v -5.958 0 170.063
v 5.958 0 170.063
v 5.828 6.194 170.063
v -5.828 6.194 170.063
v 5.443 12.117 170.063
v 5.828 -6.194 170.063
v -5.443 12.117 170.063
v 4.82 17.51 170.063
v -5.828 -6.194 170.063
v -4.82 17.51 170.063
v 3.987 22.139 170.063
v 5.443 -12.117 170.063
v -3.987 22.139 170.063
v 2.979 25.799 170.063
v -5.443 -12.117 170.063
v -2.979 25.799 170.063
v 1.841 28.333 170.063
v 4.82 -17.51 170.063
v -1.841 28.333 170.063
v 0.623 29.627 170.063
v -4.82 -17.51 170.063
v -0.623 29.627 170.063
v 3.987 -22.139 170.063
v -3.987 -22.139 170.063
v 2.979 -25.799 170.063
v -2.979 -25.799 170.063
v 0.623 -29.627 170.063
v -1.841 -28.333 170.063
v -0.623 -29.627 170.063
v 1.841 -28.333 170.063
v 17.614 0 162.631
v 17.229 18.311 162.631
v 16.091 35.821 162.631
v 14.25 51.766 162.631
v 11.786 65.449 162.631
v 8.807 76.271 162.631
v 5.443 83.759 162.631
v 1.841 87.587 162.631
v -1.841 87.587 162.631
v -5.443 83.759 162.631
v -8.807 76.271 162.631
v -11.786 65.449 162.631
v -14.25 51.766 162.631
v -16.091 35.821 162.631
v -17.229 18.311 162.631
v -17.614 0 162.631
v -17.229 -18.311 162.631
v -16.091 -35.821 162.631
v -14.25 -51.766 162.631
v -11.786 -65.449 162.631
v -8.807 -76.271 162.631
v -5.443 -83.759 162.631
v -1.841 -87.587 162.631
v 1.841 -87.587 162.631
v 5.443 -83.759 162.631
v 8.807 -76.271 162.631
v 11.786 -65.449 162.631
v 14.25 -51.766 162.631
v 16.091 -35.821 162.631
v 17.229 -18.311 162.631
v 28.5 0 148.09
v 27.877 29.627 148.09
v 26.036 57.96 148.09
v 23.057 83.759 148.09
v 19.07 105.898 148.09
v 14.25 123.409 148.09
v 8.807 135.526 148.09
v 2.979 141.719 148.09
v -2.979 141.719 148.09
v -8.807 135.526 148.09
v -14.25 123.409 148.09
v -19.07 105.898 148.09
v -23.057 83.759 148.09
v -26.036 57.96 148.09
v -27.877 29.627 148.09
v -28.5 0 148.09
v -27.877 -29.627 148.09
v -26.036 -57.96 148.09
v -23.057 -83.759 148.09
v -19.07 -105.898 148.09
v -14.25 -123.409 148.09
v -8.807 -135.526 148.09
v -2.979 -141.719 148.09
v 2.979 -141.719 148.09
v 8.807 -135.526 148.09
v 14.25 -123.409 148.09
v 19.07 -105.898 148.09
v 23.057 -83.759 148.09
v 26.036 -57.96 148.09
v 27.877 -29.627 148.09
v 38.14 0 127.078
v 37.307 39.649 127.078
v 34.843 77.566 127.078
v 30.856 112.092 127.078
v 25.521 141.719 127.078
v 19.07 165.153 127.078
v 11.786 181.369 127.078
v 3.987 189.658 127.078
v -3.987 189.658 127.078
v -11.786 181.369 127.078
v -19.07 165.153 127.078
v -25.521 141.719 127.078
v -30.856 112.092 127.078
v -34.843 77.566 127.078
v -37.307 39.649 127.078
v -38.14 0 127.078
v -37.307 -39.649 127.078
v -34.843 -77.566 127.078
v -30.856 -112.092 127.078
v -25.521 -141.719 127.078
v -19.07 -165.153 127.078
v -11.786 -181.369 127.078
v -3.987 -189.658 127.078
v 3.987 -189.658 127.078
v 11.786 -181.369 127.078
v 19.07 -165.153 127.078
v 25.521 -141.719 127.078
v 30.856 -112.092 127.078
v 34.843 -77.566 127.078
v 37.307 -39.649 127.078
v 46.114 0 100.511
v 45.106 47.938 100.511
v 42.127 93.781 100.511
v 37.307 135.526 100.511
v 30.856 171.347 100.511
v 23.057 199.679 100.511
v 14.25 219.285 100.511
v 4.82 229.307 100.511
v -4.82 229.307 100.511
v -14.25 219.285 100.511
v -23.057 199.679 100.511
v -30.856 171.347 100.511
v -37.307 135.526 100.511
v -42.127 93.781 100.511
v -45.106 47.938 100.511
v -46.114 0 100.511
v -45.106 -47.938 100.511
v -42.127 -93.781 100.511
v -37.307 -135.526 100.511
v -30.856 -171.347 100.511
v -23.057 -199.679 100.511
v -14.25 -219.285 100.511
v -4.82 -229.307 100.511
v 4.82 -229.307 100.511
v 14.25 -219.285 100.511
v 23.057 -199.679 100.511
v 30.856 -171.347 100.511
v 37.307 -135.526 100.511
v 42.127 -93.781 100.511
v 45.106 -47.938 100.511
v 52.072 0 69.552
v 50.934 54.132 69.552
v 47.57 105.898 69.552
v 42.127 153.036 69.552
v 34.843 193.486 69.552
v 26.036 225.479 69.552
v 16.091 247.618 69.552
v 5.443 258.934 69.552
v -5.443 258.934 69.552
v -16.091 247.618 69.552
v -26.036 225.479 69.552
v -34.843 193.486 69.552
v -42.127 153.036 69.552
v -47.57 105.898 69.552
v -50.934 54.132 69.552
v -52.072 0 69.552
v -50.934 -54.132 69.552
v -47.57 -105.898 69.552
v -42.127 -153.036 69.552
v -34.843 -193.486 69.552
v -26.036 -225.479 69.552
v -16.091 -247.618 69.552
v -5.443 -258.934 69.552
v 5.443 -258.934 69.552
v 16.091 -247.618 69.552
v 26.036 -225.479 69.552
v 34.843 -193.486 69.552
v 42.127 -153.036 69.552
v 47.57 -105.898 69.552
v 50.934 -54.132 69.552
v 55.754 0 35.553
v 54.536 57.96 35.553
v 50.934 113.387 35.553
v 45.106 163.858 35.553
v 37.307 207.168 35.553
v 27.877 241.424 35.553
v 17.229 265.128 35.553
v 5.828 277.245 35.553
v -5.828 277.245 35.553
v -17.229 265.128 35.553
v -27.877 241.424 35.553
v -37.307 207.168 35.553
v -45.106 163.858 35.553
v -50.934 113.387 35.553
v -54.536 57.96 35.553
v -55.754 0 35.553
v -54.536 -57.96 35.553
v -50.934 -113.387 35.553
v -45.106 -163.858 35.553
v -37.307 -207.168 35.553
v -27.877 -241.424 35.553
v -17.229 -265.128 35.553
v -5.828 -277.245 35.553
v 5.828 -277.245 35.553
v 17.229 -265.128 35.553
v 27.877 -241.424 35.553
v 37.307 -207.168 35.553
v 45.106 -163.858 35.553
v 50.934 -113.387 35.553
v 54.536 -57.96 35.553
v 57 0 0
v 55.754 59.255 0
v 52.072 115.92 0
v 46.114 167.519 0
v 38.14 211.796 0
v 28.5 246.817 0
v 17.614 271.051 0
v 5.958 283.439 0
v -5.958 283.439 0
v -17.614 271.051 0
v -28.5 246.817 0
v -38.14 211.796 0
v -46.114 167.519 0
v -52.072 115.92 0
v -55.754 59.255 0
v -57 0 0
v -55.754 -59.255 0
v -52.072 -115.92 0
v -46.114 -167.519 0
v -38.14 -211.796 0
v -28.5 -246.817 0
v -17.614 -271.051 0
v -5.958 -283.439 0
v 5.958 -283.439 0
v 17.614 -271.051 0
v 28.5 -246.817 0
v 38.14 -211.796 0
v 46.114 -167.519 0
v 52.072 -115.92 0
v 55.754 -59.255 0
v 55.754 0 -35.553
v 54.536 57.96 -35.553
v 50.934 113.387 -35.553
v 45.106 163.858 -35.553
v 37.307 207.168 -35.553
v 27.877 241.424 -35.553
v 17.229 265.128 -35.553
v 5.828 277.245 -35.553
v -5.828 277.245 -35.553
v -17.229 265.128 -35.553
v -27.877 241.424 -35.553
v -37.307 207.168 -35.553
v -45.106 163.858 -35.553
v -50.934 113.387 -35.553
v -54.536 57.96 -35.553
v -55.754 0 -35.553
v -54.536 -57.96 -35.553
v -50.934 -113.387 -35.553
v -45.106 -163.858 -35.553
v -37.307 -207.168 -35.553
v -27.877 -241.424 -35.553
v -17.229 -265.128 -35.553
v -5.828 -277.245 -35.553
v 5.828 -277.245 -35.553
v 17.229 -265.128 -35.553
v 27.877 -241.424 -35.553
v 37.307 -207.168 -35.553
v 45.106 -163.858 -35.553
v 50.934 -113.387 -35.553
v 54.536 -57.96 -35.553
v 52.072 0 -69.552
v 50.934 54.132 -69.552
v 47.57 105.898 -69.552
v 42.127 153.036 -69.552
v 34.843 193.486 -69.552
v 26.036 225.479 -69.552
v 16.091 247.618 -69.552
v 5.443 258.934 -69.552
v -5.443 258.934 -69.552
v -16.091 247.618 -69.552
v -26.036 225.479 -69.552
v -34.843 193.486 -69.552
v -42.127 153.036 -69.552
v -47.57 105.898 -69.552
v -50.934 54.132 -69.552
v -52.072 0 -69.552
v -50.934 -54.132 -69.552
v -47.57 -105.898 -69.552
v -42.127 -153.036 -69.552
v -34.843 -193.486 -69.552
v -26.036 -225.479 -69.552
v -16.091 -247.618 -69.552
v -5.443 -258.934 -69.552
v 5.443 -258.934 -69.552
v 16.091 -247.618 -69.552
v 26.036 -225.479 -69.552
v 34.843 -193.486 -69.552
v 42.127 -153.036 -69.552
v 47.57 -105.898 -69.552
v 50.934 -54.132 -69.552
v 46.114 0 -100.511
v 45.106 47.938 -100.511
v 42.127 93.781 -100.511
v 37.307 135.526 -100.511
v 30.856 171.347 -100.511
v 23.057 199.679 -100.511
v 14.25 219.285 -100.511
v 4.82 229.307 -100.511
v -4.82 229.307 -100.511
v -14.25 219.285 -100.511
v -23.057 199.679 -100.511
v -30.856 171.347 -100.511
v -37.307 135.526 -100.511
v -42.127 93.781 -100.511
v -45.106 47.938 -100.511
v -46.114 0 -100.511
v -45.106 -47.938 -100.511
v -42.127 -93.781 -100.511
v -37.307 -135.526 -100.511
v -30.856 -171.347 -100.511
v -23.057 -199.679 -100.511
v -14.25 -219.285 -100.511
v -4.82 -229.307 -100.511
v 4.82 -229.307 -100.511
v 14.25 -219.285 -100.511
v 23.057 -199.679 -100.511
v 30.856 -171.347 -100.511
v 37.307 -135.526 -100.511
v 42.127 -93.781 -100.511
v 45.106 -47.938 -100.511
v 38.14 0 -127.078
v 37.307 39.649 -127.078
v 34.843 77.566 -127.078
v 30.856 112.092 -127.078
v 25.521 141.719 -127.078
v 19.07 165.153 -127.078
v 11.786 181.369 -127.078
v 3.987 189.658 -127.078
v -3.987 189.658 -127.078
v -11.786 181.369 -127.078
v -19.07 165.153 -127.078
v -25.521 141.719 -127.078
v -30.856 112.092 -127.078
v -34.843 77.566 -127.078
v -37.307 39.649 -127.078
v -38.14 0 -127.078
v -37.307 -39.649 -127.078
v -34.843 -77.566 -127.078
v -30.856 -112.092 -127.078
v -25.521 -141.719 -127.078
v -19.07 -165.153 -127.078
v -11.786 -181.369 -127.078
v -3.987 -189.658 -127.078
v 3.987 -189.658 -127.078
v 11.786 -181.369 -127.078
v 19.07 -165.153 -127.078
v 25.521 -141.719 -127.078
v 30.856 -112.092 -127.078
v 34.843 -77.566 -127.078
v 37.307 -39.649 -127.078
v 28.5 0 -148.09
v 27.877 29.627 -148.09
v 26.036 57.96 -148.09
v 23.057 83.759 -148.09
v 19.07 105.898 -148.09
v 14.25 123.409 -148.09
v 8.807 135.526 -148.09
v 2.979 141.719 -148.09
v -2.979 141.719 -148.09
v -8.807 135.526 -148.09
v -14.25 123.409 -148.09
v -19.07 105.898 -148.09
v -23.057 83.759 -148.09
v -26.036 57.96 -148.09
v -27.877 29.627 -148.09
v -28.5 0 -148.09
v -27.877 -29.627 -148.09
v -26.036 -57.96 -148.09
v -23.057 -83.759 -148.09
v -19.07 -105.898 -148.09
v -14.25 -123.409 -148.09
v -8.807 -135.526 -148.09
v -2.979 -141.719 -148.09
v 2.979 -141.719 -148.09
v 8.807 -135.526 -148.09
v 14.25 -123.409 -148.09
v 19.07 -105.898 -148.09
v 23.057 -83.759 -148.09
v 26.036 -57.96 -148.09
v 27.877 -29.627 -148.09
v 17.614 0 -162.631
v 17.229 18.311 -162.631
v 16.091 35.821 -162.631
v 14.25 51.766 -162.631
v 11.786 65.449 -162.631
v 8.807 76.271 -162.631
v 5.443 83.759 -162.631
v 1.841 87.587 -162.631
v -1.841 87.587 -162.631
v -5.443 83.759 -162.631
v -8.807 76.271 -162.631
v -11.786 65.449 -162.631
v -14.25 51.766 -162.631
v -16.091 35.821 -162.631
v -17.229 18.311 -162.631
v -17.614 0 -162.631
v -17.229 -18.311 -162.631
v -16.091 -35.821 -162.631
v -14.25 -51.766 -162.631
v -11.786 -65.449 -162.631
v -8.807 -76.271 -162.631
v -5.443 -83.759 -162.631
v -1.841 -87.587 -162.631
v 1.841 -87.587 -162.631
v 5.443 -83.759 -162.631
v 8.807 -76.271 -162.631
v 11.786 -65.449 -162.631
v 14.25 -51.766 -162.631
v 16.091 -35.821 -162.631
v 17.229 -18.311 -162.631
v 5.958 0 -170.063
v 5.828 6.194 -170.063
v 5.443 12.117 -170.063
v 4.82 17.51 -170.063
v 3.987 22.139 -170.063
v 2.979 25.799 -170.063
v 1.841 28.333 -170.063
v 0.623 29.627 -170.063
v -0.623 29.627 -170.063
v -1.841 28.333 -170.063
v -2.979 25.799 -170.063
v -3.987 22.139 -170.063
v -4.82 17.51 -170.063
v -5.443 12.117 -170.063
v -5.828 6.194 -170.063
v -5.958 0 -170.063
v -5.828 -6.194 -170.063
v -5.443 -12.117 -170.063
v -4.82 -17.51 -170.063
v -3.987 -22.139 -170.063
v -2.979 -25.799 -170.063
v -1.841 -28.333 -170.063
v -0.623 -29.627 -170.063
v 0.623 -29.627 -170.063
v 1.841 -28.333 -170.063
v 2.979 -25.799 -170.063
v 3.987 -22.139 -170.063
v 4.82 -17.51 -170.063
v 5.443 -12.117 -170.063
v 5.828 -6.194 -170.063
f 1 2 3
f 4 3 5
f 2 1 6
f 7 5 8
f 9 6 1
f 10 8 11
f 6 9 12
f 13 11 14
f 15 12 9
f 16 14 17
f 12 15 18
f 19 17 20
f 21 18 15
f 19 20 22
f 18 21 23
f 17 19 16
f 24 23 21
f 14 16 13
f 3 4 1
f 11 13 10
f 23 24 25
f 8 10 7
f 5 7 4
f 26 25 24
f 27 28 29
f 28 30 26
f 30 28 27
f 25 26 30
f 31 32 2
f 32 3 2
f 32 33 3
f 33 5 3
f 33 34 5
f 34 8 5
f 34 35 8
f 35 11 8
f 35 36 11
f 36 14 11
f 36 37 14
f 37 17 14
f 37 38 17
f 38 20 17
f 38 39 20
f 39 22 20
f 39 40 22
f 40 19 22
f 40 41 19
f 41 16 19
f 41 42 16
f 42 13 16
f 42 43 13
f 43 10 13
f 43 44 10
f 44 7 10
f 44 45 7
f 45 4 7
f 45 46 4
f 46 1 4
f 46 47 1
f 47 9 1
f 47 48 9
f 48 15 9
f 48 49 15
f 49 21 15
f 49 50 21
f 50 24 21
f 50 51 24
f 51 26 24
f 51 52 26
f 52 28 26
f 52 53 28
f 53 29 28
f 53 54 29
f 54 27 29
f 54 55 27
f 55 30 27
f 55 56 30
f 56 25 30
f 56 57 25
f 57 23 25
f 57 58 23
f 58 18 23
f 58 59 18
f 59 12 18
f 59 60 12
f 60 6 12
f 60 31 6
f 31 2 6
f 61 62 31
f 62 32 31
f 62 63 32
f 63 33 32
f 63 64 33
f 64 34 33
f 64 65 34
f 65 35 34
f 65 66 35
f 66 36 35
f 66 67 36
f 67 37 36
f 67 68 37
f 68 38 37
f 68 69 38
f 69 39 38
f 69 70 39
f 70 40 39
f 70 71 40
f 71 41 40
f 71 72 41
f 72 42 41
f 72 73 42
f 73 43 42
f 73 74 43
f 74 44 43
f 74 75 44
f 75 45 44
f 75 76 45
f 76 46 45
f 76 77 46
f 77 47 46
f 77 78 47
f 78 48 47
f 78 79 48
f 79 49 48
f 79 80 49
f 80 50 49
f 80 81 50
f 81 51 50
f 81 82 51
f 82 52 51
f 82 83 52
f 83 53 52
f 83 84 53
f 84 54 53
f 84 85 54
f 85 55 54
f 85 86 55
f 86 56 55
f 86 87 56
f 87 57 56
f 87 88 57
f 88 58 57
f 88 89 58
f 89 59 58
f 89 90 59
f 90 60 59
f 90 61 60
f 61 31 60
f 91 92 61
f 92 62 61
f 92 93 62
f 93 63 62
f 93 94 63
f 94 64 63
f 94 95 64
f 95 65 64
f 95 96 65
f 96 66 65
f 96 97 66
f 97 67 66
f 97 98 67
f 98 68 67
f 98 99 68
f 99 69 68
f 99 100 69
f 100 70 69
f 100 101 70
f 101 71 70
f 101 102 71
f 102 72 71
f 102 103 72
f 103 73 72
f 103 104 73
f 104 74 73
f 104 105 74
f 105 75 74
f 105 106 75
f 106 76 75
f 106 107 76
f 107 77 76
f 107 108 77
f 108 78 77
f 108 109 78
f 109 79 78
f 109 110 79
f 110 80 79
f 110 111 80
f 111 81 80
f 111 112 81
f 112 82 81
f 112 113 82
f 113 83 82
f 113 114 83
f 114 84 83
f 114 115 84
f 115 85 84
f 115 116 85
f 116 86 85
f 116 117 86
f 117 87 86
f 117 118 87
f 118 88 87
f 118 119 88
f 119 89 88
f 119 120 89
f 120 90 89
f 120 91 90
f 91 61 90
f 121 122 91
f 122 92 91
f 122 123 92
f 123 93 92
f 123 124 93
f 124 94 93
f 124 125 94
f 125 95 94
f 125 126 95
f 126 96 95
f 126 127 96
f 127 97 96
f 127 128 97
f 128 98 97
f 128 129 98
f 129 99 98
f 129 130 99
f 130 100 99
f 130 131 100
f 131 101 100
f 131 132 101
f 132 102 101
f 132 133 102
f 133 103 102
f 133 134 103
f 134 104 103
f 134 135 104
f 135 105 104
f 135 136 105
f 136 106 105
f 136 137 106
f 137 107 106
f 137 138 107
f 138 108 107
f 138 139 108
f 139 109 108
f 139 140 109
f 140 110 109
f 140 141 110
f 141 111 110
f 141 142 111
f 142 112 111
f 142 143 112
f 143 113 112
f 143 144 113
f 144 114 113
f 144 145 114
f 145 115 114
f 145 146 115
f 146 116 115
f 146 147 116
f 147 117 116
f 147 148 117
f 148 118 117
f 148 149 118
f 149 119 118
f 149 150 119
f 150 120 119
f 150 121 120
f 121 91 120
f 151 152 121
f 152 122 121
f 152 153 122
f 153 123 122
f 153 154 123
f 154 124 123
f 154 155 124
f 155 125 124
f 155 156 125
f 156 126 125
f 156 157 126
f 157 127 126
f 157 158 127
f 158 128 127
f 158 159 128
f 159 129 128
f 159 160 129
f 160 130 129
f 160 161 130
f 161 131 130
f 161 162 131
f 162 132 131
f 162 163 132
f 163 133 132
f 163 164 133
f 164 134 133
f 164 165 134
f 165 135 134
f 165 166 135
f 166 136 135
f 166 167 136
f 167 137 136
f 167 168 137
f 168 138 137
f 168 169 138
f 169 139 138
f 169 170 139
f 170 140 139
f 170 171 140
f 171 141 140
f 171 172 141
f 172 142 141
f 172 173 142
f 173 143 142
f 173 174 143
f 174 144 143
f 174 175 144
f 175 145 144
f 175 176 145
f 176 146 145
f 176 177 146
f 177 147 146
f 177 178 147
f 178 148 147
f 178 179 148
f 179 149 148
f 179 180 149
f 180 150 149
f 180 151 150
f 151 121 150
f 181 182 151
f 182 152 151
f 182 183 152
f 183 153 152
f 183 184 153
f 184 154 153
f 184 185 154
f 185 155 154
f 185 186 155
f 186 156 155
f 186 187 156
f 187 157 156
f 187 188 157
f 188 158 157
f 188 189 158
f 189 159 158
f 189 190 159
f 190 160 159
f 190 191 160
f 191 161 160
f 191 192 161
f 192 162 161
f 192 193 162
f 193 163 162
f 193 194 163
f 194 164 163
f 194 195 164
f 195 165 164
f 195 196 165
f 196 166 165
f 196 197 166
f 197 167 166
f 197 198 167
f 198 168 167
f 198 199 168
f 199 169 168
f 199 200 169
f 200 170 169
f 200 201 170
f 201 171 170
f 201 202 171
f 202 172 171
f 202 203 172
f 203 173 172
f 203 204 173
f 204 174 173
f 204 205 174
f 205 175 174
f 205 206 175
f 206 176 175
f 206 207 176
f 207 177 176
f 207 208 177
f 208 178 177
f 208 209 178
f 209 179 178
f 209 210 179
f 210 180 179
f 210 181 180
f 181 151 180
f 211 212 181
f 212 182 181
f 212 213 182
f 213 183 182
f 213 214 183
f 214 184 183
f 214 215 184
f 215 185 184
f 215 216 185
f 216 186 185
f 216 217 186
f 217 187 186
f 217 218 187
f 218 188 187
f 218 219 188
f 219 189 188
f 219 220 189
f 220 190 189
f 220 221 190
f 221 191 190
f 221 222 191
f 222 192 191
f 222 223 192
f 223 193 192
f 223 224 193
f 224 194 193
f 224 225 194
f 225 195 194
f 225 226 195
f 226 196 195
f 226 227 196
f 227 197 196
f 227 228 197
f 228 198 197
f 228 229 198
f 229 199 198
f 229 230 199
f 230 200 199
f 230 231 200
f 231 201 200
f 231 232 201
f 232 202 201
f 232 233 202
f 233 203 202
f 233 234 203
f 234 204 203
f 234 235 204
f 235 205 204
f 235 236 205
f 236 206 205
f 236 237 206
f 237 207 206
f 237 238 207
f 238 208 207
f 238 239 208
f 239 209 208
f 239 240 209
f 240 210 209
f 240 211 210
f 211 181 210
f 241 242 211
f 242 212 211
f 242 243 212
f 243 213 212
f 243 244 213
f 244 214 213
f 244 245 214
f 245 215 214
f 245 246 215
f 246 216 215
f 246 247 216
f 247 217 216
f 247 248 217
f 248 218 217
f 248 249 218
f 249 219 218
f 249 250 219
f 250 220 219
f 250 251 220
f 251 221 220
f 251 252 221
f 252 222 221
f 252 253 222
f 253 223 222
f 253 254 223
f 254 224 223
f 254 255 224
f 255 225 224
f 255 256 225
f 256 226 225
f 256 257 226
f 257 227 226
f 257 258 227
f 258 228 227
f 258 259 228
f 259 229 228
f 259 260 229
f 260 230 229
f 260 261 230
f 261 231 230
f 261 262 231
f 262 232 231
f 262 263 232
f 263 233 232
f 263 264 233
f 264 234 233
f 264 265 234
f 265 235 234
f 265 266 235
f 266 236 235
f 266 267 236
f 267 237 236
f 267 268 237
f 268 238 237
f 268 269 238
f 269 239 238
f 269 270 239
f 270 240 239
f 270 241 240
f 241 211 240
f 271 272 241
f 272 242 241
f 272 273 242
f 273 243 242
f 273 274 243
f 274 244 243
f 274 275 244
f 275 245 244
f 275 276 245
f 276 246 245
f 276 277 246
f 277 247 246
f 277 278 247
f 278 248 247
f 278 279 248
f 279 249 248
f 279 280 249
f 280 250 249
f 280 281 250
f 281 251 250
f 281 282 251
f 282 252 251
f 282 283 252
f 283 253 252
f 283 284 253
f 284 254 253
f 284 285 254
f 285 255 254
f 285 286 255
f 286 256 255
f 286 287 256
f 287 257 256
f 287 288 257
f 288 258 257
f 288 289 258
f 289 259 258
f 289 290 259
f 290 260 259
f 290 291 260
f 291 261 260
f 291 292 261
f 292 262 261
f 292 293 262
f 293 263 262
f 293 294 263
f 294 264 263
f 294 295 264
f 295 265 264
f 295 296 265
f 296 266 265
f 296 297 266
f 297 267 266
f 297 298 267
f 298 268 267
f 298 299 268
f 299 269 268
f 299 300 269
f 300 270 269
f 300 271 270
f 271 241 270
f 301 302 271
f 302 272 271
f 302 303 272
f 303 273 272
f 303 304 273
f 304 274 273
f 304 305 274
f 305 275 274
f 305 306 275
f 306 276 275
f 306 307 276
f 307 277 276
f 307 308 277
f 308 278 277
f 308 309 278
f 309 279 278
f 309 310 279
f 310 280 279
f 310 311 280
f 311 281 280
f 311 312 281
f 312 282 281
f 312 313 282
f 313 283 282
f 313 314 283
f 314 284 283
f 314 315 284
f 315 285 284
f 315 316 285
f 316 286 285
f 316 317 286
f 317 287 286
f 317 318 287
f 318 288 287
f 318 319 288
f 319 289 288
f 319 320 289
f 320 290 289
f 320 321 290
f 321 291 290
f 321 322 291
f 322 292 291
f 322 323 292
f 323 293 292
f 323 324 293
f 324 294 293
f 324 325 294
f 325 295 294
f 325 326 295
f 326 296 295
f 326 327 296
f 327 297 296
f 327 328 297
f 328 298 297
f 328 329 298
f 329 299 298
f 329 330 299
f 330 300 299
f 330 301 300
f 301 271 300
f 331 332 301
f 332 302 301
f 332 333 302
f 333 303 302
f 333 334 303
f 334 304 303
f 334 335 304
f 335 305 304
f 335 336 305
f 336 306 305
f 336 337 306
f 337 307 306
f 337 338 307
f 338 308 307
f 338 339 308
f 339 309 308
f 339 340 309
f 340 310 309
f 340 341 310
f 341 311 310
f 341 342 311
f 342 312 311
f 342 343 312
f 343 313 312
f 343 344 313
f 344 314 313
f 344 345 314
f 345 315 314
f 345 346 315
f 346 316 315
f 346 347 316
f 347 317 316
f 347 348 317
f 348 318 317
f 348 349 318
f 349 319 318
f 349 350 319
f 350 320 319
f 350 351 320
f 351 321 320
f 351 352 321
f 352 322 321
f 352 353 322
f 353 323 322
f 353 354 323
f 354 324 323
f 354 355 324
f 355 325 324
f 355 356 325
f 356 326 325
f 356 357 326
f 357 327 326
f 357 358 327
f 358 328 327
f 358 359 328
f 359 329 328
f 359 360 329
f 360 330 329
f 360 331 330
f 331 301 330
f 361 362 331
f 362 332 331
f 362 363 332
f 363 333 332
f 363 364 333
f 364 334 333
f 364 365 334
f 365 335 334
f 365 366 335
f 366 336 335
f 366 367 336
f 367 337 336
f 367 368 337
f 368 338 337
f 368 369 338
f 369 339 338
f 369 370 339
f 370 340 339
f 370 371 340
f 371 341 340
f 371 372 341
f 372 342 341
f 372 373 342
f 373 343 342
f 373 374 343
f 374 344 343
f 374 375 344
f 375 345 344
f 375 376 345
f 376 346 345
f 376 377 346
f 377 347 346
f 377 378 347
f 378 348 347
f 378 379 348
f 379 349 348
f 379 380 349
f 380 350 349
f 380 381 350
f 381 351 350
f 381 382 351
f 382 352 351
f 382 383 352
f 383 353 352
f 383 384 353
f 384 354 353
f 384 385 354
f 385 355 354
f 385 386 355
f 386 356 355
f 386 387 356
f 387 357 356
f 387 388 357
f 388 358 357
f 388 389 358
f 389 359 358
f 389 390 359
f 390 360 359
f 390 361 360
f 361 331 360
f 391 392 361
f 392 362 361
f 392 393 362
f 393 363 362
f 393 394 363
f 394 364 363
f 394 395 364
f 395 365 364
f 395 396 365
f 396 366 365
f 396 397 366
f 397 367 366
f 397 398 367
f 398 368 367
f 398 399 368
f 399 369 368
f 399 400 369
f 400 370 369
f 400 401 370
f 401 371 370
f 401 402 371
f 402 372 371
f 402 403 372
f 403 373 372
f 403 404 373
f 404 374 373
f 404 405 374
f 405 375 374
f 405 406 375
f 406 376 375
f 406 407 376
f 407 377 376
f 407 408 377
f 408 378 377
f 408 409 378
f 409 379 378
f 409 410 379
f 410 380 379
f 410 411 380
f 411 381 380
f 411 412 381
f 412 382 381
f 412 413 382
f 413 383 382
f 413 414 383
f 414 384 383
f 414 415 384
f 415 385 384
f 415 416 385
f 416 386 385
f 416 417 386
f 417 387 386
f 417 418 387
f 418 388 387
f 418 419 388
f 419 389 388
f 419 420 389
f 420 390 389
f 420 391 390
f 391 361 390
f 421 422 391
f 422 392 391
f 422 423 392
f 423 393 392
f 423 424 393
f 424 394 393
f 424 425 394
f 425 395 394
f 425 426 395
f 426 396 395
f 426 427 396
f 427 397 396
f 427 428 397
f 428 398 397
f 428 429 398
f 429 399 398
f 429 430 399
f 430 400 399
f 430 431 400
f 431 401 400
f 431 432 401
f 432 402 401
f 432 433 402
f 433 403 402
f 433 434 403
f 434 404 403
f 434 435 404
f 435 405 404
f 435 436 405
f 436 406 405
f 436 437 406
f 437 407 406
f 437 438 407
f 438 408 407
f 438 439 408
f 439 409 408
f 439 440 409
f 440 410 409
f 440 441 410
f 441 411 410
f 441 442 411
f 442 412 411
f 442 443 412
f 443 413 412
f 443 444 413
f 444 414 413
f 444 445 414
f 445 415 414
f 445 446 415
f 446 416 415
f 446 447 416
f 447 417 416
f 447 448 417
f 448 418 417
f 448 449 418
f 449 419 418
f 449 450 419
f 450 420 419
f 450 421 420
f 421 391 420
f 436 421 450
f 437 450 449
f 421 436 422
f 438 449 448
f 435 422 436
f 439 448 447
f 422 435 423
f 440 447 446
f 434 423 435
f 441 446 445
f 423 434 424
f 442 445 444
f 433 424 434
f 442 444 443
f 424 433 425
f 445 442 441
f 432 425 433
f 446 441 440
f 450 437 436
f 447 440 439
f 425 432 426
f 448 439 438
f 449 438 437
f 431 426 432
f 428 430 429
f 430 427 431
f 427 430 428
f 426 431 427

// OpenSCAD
// Generated by SolidPython 1.0.1 on 2020-07-29 00:46:45


scale(v = [3, 15, 9]) {
	sphere(r = 19);
}
/***********************************************
*********      SolidPython code:      **********
************************************************
 
# import packages: SolidPython
from solid import *
from solid.utils import *
from itertools import chain, combinations, permutations


class Resize:

    def __init__(self, scad_file):
        self.scad_file = scad_file
        #self.scad_file = import_scad(scad_file)
        # cone/cylinder param:
        self.r1 = 0
        self.r2 = 0
        self.h = 0
        # rectangular prism param:
        self.w = 0
        self.l = 0
        # ellipse param:
        self.r = 0

    # import OpenScad code (file name corresponds to shape)


    # classify shape + parameters
    def assign(self, param1, param2, param3):
        if self.scad_file == 'cone.scad':
            self.r1 = param1
            self.r2 = param2
            self.h = param3
        elif self.scad_file == 'cylinder.scad':
            self.r1 = param1
            self.r2 = param2
            self.h = param3
        elif self.scad_file == 'rectangularPrism.scad':
            self.h = param1
            self.l = param2
            self.w = param3
        else:
            self.r = param1
            self.h = param2

    # resize parameters
    def iterate(self):
        x = range(3, 20, 2)
        i = 1
        if self.scad_file == 'cone.scad':
            tempList = list(permutations(x, 2))
            for temp in tempList:
                param1 = temp[0]
                param2 = temp[1]
                filepath = 'produced_scad_files/' + 'cone' + str(param1) + '_' + str(param2) + '_' + '.scad'
                scad_render_to_file(cylinder(h=param1, r1=param2, r2=0), filepath)

        elif self.scad_file == 'cylinder.scad':
            tempList = list(permutations(x, 3))
            for temp in tempList:
                param1 = temp[0]
                param2 = temp[1]
                filepath = 'produced_scad_files/' + 'cylinder' + str(param1) + '_' + str(param2) + '_' + '.scad'
                scad_render_to_file(cylinder(h=param1, r1=param2, r2=param2), filepath)

        elif self.scad_file == 'rectangularPrism.scad':
            tempList = list(permutations(x, 3))
            for temp in tempList:
                param1 = temp[0]
                param2 = temp[1]
                param3 = temp[2]
                filepath = 'produced_scad_files/' + 'rectangularPrism' + str(param1) + '_' + str(param2) + '_' + str(
                    param3) + '.scad'
                scad_render_to_file(cube(size=(param1, param2, param3)), filepath)

        elif self.scad_file == 'ellipse.scad':
            tempList = list(permutations(x, 4))
            for temp in tempList:
                param1 = temp[0]
                param2 = temp[1]
                param3 = temp[2]
                param4 = temp[3]
                filepath = 'produced_scad_files/' + 'ellipse' + str(param1) + '_' + str(param2) + '_' + str(param3) + '_' + str(param4) + '.scad'
                scad_render_to_file(scale([param1, param2, param3])(sphere(r=param4)), filepath)

    def render_to_scadfile(self):
        scad_render_to_file(scad, 'example.scad') 
 
************************************************/
